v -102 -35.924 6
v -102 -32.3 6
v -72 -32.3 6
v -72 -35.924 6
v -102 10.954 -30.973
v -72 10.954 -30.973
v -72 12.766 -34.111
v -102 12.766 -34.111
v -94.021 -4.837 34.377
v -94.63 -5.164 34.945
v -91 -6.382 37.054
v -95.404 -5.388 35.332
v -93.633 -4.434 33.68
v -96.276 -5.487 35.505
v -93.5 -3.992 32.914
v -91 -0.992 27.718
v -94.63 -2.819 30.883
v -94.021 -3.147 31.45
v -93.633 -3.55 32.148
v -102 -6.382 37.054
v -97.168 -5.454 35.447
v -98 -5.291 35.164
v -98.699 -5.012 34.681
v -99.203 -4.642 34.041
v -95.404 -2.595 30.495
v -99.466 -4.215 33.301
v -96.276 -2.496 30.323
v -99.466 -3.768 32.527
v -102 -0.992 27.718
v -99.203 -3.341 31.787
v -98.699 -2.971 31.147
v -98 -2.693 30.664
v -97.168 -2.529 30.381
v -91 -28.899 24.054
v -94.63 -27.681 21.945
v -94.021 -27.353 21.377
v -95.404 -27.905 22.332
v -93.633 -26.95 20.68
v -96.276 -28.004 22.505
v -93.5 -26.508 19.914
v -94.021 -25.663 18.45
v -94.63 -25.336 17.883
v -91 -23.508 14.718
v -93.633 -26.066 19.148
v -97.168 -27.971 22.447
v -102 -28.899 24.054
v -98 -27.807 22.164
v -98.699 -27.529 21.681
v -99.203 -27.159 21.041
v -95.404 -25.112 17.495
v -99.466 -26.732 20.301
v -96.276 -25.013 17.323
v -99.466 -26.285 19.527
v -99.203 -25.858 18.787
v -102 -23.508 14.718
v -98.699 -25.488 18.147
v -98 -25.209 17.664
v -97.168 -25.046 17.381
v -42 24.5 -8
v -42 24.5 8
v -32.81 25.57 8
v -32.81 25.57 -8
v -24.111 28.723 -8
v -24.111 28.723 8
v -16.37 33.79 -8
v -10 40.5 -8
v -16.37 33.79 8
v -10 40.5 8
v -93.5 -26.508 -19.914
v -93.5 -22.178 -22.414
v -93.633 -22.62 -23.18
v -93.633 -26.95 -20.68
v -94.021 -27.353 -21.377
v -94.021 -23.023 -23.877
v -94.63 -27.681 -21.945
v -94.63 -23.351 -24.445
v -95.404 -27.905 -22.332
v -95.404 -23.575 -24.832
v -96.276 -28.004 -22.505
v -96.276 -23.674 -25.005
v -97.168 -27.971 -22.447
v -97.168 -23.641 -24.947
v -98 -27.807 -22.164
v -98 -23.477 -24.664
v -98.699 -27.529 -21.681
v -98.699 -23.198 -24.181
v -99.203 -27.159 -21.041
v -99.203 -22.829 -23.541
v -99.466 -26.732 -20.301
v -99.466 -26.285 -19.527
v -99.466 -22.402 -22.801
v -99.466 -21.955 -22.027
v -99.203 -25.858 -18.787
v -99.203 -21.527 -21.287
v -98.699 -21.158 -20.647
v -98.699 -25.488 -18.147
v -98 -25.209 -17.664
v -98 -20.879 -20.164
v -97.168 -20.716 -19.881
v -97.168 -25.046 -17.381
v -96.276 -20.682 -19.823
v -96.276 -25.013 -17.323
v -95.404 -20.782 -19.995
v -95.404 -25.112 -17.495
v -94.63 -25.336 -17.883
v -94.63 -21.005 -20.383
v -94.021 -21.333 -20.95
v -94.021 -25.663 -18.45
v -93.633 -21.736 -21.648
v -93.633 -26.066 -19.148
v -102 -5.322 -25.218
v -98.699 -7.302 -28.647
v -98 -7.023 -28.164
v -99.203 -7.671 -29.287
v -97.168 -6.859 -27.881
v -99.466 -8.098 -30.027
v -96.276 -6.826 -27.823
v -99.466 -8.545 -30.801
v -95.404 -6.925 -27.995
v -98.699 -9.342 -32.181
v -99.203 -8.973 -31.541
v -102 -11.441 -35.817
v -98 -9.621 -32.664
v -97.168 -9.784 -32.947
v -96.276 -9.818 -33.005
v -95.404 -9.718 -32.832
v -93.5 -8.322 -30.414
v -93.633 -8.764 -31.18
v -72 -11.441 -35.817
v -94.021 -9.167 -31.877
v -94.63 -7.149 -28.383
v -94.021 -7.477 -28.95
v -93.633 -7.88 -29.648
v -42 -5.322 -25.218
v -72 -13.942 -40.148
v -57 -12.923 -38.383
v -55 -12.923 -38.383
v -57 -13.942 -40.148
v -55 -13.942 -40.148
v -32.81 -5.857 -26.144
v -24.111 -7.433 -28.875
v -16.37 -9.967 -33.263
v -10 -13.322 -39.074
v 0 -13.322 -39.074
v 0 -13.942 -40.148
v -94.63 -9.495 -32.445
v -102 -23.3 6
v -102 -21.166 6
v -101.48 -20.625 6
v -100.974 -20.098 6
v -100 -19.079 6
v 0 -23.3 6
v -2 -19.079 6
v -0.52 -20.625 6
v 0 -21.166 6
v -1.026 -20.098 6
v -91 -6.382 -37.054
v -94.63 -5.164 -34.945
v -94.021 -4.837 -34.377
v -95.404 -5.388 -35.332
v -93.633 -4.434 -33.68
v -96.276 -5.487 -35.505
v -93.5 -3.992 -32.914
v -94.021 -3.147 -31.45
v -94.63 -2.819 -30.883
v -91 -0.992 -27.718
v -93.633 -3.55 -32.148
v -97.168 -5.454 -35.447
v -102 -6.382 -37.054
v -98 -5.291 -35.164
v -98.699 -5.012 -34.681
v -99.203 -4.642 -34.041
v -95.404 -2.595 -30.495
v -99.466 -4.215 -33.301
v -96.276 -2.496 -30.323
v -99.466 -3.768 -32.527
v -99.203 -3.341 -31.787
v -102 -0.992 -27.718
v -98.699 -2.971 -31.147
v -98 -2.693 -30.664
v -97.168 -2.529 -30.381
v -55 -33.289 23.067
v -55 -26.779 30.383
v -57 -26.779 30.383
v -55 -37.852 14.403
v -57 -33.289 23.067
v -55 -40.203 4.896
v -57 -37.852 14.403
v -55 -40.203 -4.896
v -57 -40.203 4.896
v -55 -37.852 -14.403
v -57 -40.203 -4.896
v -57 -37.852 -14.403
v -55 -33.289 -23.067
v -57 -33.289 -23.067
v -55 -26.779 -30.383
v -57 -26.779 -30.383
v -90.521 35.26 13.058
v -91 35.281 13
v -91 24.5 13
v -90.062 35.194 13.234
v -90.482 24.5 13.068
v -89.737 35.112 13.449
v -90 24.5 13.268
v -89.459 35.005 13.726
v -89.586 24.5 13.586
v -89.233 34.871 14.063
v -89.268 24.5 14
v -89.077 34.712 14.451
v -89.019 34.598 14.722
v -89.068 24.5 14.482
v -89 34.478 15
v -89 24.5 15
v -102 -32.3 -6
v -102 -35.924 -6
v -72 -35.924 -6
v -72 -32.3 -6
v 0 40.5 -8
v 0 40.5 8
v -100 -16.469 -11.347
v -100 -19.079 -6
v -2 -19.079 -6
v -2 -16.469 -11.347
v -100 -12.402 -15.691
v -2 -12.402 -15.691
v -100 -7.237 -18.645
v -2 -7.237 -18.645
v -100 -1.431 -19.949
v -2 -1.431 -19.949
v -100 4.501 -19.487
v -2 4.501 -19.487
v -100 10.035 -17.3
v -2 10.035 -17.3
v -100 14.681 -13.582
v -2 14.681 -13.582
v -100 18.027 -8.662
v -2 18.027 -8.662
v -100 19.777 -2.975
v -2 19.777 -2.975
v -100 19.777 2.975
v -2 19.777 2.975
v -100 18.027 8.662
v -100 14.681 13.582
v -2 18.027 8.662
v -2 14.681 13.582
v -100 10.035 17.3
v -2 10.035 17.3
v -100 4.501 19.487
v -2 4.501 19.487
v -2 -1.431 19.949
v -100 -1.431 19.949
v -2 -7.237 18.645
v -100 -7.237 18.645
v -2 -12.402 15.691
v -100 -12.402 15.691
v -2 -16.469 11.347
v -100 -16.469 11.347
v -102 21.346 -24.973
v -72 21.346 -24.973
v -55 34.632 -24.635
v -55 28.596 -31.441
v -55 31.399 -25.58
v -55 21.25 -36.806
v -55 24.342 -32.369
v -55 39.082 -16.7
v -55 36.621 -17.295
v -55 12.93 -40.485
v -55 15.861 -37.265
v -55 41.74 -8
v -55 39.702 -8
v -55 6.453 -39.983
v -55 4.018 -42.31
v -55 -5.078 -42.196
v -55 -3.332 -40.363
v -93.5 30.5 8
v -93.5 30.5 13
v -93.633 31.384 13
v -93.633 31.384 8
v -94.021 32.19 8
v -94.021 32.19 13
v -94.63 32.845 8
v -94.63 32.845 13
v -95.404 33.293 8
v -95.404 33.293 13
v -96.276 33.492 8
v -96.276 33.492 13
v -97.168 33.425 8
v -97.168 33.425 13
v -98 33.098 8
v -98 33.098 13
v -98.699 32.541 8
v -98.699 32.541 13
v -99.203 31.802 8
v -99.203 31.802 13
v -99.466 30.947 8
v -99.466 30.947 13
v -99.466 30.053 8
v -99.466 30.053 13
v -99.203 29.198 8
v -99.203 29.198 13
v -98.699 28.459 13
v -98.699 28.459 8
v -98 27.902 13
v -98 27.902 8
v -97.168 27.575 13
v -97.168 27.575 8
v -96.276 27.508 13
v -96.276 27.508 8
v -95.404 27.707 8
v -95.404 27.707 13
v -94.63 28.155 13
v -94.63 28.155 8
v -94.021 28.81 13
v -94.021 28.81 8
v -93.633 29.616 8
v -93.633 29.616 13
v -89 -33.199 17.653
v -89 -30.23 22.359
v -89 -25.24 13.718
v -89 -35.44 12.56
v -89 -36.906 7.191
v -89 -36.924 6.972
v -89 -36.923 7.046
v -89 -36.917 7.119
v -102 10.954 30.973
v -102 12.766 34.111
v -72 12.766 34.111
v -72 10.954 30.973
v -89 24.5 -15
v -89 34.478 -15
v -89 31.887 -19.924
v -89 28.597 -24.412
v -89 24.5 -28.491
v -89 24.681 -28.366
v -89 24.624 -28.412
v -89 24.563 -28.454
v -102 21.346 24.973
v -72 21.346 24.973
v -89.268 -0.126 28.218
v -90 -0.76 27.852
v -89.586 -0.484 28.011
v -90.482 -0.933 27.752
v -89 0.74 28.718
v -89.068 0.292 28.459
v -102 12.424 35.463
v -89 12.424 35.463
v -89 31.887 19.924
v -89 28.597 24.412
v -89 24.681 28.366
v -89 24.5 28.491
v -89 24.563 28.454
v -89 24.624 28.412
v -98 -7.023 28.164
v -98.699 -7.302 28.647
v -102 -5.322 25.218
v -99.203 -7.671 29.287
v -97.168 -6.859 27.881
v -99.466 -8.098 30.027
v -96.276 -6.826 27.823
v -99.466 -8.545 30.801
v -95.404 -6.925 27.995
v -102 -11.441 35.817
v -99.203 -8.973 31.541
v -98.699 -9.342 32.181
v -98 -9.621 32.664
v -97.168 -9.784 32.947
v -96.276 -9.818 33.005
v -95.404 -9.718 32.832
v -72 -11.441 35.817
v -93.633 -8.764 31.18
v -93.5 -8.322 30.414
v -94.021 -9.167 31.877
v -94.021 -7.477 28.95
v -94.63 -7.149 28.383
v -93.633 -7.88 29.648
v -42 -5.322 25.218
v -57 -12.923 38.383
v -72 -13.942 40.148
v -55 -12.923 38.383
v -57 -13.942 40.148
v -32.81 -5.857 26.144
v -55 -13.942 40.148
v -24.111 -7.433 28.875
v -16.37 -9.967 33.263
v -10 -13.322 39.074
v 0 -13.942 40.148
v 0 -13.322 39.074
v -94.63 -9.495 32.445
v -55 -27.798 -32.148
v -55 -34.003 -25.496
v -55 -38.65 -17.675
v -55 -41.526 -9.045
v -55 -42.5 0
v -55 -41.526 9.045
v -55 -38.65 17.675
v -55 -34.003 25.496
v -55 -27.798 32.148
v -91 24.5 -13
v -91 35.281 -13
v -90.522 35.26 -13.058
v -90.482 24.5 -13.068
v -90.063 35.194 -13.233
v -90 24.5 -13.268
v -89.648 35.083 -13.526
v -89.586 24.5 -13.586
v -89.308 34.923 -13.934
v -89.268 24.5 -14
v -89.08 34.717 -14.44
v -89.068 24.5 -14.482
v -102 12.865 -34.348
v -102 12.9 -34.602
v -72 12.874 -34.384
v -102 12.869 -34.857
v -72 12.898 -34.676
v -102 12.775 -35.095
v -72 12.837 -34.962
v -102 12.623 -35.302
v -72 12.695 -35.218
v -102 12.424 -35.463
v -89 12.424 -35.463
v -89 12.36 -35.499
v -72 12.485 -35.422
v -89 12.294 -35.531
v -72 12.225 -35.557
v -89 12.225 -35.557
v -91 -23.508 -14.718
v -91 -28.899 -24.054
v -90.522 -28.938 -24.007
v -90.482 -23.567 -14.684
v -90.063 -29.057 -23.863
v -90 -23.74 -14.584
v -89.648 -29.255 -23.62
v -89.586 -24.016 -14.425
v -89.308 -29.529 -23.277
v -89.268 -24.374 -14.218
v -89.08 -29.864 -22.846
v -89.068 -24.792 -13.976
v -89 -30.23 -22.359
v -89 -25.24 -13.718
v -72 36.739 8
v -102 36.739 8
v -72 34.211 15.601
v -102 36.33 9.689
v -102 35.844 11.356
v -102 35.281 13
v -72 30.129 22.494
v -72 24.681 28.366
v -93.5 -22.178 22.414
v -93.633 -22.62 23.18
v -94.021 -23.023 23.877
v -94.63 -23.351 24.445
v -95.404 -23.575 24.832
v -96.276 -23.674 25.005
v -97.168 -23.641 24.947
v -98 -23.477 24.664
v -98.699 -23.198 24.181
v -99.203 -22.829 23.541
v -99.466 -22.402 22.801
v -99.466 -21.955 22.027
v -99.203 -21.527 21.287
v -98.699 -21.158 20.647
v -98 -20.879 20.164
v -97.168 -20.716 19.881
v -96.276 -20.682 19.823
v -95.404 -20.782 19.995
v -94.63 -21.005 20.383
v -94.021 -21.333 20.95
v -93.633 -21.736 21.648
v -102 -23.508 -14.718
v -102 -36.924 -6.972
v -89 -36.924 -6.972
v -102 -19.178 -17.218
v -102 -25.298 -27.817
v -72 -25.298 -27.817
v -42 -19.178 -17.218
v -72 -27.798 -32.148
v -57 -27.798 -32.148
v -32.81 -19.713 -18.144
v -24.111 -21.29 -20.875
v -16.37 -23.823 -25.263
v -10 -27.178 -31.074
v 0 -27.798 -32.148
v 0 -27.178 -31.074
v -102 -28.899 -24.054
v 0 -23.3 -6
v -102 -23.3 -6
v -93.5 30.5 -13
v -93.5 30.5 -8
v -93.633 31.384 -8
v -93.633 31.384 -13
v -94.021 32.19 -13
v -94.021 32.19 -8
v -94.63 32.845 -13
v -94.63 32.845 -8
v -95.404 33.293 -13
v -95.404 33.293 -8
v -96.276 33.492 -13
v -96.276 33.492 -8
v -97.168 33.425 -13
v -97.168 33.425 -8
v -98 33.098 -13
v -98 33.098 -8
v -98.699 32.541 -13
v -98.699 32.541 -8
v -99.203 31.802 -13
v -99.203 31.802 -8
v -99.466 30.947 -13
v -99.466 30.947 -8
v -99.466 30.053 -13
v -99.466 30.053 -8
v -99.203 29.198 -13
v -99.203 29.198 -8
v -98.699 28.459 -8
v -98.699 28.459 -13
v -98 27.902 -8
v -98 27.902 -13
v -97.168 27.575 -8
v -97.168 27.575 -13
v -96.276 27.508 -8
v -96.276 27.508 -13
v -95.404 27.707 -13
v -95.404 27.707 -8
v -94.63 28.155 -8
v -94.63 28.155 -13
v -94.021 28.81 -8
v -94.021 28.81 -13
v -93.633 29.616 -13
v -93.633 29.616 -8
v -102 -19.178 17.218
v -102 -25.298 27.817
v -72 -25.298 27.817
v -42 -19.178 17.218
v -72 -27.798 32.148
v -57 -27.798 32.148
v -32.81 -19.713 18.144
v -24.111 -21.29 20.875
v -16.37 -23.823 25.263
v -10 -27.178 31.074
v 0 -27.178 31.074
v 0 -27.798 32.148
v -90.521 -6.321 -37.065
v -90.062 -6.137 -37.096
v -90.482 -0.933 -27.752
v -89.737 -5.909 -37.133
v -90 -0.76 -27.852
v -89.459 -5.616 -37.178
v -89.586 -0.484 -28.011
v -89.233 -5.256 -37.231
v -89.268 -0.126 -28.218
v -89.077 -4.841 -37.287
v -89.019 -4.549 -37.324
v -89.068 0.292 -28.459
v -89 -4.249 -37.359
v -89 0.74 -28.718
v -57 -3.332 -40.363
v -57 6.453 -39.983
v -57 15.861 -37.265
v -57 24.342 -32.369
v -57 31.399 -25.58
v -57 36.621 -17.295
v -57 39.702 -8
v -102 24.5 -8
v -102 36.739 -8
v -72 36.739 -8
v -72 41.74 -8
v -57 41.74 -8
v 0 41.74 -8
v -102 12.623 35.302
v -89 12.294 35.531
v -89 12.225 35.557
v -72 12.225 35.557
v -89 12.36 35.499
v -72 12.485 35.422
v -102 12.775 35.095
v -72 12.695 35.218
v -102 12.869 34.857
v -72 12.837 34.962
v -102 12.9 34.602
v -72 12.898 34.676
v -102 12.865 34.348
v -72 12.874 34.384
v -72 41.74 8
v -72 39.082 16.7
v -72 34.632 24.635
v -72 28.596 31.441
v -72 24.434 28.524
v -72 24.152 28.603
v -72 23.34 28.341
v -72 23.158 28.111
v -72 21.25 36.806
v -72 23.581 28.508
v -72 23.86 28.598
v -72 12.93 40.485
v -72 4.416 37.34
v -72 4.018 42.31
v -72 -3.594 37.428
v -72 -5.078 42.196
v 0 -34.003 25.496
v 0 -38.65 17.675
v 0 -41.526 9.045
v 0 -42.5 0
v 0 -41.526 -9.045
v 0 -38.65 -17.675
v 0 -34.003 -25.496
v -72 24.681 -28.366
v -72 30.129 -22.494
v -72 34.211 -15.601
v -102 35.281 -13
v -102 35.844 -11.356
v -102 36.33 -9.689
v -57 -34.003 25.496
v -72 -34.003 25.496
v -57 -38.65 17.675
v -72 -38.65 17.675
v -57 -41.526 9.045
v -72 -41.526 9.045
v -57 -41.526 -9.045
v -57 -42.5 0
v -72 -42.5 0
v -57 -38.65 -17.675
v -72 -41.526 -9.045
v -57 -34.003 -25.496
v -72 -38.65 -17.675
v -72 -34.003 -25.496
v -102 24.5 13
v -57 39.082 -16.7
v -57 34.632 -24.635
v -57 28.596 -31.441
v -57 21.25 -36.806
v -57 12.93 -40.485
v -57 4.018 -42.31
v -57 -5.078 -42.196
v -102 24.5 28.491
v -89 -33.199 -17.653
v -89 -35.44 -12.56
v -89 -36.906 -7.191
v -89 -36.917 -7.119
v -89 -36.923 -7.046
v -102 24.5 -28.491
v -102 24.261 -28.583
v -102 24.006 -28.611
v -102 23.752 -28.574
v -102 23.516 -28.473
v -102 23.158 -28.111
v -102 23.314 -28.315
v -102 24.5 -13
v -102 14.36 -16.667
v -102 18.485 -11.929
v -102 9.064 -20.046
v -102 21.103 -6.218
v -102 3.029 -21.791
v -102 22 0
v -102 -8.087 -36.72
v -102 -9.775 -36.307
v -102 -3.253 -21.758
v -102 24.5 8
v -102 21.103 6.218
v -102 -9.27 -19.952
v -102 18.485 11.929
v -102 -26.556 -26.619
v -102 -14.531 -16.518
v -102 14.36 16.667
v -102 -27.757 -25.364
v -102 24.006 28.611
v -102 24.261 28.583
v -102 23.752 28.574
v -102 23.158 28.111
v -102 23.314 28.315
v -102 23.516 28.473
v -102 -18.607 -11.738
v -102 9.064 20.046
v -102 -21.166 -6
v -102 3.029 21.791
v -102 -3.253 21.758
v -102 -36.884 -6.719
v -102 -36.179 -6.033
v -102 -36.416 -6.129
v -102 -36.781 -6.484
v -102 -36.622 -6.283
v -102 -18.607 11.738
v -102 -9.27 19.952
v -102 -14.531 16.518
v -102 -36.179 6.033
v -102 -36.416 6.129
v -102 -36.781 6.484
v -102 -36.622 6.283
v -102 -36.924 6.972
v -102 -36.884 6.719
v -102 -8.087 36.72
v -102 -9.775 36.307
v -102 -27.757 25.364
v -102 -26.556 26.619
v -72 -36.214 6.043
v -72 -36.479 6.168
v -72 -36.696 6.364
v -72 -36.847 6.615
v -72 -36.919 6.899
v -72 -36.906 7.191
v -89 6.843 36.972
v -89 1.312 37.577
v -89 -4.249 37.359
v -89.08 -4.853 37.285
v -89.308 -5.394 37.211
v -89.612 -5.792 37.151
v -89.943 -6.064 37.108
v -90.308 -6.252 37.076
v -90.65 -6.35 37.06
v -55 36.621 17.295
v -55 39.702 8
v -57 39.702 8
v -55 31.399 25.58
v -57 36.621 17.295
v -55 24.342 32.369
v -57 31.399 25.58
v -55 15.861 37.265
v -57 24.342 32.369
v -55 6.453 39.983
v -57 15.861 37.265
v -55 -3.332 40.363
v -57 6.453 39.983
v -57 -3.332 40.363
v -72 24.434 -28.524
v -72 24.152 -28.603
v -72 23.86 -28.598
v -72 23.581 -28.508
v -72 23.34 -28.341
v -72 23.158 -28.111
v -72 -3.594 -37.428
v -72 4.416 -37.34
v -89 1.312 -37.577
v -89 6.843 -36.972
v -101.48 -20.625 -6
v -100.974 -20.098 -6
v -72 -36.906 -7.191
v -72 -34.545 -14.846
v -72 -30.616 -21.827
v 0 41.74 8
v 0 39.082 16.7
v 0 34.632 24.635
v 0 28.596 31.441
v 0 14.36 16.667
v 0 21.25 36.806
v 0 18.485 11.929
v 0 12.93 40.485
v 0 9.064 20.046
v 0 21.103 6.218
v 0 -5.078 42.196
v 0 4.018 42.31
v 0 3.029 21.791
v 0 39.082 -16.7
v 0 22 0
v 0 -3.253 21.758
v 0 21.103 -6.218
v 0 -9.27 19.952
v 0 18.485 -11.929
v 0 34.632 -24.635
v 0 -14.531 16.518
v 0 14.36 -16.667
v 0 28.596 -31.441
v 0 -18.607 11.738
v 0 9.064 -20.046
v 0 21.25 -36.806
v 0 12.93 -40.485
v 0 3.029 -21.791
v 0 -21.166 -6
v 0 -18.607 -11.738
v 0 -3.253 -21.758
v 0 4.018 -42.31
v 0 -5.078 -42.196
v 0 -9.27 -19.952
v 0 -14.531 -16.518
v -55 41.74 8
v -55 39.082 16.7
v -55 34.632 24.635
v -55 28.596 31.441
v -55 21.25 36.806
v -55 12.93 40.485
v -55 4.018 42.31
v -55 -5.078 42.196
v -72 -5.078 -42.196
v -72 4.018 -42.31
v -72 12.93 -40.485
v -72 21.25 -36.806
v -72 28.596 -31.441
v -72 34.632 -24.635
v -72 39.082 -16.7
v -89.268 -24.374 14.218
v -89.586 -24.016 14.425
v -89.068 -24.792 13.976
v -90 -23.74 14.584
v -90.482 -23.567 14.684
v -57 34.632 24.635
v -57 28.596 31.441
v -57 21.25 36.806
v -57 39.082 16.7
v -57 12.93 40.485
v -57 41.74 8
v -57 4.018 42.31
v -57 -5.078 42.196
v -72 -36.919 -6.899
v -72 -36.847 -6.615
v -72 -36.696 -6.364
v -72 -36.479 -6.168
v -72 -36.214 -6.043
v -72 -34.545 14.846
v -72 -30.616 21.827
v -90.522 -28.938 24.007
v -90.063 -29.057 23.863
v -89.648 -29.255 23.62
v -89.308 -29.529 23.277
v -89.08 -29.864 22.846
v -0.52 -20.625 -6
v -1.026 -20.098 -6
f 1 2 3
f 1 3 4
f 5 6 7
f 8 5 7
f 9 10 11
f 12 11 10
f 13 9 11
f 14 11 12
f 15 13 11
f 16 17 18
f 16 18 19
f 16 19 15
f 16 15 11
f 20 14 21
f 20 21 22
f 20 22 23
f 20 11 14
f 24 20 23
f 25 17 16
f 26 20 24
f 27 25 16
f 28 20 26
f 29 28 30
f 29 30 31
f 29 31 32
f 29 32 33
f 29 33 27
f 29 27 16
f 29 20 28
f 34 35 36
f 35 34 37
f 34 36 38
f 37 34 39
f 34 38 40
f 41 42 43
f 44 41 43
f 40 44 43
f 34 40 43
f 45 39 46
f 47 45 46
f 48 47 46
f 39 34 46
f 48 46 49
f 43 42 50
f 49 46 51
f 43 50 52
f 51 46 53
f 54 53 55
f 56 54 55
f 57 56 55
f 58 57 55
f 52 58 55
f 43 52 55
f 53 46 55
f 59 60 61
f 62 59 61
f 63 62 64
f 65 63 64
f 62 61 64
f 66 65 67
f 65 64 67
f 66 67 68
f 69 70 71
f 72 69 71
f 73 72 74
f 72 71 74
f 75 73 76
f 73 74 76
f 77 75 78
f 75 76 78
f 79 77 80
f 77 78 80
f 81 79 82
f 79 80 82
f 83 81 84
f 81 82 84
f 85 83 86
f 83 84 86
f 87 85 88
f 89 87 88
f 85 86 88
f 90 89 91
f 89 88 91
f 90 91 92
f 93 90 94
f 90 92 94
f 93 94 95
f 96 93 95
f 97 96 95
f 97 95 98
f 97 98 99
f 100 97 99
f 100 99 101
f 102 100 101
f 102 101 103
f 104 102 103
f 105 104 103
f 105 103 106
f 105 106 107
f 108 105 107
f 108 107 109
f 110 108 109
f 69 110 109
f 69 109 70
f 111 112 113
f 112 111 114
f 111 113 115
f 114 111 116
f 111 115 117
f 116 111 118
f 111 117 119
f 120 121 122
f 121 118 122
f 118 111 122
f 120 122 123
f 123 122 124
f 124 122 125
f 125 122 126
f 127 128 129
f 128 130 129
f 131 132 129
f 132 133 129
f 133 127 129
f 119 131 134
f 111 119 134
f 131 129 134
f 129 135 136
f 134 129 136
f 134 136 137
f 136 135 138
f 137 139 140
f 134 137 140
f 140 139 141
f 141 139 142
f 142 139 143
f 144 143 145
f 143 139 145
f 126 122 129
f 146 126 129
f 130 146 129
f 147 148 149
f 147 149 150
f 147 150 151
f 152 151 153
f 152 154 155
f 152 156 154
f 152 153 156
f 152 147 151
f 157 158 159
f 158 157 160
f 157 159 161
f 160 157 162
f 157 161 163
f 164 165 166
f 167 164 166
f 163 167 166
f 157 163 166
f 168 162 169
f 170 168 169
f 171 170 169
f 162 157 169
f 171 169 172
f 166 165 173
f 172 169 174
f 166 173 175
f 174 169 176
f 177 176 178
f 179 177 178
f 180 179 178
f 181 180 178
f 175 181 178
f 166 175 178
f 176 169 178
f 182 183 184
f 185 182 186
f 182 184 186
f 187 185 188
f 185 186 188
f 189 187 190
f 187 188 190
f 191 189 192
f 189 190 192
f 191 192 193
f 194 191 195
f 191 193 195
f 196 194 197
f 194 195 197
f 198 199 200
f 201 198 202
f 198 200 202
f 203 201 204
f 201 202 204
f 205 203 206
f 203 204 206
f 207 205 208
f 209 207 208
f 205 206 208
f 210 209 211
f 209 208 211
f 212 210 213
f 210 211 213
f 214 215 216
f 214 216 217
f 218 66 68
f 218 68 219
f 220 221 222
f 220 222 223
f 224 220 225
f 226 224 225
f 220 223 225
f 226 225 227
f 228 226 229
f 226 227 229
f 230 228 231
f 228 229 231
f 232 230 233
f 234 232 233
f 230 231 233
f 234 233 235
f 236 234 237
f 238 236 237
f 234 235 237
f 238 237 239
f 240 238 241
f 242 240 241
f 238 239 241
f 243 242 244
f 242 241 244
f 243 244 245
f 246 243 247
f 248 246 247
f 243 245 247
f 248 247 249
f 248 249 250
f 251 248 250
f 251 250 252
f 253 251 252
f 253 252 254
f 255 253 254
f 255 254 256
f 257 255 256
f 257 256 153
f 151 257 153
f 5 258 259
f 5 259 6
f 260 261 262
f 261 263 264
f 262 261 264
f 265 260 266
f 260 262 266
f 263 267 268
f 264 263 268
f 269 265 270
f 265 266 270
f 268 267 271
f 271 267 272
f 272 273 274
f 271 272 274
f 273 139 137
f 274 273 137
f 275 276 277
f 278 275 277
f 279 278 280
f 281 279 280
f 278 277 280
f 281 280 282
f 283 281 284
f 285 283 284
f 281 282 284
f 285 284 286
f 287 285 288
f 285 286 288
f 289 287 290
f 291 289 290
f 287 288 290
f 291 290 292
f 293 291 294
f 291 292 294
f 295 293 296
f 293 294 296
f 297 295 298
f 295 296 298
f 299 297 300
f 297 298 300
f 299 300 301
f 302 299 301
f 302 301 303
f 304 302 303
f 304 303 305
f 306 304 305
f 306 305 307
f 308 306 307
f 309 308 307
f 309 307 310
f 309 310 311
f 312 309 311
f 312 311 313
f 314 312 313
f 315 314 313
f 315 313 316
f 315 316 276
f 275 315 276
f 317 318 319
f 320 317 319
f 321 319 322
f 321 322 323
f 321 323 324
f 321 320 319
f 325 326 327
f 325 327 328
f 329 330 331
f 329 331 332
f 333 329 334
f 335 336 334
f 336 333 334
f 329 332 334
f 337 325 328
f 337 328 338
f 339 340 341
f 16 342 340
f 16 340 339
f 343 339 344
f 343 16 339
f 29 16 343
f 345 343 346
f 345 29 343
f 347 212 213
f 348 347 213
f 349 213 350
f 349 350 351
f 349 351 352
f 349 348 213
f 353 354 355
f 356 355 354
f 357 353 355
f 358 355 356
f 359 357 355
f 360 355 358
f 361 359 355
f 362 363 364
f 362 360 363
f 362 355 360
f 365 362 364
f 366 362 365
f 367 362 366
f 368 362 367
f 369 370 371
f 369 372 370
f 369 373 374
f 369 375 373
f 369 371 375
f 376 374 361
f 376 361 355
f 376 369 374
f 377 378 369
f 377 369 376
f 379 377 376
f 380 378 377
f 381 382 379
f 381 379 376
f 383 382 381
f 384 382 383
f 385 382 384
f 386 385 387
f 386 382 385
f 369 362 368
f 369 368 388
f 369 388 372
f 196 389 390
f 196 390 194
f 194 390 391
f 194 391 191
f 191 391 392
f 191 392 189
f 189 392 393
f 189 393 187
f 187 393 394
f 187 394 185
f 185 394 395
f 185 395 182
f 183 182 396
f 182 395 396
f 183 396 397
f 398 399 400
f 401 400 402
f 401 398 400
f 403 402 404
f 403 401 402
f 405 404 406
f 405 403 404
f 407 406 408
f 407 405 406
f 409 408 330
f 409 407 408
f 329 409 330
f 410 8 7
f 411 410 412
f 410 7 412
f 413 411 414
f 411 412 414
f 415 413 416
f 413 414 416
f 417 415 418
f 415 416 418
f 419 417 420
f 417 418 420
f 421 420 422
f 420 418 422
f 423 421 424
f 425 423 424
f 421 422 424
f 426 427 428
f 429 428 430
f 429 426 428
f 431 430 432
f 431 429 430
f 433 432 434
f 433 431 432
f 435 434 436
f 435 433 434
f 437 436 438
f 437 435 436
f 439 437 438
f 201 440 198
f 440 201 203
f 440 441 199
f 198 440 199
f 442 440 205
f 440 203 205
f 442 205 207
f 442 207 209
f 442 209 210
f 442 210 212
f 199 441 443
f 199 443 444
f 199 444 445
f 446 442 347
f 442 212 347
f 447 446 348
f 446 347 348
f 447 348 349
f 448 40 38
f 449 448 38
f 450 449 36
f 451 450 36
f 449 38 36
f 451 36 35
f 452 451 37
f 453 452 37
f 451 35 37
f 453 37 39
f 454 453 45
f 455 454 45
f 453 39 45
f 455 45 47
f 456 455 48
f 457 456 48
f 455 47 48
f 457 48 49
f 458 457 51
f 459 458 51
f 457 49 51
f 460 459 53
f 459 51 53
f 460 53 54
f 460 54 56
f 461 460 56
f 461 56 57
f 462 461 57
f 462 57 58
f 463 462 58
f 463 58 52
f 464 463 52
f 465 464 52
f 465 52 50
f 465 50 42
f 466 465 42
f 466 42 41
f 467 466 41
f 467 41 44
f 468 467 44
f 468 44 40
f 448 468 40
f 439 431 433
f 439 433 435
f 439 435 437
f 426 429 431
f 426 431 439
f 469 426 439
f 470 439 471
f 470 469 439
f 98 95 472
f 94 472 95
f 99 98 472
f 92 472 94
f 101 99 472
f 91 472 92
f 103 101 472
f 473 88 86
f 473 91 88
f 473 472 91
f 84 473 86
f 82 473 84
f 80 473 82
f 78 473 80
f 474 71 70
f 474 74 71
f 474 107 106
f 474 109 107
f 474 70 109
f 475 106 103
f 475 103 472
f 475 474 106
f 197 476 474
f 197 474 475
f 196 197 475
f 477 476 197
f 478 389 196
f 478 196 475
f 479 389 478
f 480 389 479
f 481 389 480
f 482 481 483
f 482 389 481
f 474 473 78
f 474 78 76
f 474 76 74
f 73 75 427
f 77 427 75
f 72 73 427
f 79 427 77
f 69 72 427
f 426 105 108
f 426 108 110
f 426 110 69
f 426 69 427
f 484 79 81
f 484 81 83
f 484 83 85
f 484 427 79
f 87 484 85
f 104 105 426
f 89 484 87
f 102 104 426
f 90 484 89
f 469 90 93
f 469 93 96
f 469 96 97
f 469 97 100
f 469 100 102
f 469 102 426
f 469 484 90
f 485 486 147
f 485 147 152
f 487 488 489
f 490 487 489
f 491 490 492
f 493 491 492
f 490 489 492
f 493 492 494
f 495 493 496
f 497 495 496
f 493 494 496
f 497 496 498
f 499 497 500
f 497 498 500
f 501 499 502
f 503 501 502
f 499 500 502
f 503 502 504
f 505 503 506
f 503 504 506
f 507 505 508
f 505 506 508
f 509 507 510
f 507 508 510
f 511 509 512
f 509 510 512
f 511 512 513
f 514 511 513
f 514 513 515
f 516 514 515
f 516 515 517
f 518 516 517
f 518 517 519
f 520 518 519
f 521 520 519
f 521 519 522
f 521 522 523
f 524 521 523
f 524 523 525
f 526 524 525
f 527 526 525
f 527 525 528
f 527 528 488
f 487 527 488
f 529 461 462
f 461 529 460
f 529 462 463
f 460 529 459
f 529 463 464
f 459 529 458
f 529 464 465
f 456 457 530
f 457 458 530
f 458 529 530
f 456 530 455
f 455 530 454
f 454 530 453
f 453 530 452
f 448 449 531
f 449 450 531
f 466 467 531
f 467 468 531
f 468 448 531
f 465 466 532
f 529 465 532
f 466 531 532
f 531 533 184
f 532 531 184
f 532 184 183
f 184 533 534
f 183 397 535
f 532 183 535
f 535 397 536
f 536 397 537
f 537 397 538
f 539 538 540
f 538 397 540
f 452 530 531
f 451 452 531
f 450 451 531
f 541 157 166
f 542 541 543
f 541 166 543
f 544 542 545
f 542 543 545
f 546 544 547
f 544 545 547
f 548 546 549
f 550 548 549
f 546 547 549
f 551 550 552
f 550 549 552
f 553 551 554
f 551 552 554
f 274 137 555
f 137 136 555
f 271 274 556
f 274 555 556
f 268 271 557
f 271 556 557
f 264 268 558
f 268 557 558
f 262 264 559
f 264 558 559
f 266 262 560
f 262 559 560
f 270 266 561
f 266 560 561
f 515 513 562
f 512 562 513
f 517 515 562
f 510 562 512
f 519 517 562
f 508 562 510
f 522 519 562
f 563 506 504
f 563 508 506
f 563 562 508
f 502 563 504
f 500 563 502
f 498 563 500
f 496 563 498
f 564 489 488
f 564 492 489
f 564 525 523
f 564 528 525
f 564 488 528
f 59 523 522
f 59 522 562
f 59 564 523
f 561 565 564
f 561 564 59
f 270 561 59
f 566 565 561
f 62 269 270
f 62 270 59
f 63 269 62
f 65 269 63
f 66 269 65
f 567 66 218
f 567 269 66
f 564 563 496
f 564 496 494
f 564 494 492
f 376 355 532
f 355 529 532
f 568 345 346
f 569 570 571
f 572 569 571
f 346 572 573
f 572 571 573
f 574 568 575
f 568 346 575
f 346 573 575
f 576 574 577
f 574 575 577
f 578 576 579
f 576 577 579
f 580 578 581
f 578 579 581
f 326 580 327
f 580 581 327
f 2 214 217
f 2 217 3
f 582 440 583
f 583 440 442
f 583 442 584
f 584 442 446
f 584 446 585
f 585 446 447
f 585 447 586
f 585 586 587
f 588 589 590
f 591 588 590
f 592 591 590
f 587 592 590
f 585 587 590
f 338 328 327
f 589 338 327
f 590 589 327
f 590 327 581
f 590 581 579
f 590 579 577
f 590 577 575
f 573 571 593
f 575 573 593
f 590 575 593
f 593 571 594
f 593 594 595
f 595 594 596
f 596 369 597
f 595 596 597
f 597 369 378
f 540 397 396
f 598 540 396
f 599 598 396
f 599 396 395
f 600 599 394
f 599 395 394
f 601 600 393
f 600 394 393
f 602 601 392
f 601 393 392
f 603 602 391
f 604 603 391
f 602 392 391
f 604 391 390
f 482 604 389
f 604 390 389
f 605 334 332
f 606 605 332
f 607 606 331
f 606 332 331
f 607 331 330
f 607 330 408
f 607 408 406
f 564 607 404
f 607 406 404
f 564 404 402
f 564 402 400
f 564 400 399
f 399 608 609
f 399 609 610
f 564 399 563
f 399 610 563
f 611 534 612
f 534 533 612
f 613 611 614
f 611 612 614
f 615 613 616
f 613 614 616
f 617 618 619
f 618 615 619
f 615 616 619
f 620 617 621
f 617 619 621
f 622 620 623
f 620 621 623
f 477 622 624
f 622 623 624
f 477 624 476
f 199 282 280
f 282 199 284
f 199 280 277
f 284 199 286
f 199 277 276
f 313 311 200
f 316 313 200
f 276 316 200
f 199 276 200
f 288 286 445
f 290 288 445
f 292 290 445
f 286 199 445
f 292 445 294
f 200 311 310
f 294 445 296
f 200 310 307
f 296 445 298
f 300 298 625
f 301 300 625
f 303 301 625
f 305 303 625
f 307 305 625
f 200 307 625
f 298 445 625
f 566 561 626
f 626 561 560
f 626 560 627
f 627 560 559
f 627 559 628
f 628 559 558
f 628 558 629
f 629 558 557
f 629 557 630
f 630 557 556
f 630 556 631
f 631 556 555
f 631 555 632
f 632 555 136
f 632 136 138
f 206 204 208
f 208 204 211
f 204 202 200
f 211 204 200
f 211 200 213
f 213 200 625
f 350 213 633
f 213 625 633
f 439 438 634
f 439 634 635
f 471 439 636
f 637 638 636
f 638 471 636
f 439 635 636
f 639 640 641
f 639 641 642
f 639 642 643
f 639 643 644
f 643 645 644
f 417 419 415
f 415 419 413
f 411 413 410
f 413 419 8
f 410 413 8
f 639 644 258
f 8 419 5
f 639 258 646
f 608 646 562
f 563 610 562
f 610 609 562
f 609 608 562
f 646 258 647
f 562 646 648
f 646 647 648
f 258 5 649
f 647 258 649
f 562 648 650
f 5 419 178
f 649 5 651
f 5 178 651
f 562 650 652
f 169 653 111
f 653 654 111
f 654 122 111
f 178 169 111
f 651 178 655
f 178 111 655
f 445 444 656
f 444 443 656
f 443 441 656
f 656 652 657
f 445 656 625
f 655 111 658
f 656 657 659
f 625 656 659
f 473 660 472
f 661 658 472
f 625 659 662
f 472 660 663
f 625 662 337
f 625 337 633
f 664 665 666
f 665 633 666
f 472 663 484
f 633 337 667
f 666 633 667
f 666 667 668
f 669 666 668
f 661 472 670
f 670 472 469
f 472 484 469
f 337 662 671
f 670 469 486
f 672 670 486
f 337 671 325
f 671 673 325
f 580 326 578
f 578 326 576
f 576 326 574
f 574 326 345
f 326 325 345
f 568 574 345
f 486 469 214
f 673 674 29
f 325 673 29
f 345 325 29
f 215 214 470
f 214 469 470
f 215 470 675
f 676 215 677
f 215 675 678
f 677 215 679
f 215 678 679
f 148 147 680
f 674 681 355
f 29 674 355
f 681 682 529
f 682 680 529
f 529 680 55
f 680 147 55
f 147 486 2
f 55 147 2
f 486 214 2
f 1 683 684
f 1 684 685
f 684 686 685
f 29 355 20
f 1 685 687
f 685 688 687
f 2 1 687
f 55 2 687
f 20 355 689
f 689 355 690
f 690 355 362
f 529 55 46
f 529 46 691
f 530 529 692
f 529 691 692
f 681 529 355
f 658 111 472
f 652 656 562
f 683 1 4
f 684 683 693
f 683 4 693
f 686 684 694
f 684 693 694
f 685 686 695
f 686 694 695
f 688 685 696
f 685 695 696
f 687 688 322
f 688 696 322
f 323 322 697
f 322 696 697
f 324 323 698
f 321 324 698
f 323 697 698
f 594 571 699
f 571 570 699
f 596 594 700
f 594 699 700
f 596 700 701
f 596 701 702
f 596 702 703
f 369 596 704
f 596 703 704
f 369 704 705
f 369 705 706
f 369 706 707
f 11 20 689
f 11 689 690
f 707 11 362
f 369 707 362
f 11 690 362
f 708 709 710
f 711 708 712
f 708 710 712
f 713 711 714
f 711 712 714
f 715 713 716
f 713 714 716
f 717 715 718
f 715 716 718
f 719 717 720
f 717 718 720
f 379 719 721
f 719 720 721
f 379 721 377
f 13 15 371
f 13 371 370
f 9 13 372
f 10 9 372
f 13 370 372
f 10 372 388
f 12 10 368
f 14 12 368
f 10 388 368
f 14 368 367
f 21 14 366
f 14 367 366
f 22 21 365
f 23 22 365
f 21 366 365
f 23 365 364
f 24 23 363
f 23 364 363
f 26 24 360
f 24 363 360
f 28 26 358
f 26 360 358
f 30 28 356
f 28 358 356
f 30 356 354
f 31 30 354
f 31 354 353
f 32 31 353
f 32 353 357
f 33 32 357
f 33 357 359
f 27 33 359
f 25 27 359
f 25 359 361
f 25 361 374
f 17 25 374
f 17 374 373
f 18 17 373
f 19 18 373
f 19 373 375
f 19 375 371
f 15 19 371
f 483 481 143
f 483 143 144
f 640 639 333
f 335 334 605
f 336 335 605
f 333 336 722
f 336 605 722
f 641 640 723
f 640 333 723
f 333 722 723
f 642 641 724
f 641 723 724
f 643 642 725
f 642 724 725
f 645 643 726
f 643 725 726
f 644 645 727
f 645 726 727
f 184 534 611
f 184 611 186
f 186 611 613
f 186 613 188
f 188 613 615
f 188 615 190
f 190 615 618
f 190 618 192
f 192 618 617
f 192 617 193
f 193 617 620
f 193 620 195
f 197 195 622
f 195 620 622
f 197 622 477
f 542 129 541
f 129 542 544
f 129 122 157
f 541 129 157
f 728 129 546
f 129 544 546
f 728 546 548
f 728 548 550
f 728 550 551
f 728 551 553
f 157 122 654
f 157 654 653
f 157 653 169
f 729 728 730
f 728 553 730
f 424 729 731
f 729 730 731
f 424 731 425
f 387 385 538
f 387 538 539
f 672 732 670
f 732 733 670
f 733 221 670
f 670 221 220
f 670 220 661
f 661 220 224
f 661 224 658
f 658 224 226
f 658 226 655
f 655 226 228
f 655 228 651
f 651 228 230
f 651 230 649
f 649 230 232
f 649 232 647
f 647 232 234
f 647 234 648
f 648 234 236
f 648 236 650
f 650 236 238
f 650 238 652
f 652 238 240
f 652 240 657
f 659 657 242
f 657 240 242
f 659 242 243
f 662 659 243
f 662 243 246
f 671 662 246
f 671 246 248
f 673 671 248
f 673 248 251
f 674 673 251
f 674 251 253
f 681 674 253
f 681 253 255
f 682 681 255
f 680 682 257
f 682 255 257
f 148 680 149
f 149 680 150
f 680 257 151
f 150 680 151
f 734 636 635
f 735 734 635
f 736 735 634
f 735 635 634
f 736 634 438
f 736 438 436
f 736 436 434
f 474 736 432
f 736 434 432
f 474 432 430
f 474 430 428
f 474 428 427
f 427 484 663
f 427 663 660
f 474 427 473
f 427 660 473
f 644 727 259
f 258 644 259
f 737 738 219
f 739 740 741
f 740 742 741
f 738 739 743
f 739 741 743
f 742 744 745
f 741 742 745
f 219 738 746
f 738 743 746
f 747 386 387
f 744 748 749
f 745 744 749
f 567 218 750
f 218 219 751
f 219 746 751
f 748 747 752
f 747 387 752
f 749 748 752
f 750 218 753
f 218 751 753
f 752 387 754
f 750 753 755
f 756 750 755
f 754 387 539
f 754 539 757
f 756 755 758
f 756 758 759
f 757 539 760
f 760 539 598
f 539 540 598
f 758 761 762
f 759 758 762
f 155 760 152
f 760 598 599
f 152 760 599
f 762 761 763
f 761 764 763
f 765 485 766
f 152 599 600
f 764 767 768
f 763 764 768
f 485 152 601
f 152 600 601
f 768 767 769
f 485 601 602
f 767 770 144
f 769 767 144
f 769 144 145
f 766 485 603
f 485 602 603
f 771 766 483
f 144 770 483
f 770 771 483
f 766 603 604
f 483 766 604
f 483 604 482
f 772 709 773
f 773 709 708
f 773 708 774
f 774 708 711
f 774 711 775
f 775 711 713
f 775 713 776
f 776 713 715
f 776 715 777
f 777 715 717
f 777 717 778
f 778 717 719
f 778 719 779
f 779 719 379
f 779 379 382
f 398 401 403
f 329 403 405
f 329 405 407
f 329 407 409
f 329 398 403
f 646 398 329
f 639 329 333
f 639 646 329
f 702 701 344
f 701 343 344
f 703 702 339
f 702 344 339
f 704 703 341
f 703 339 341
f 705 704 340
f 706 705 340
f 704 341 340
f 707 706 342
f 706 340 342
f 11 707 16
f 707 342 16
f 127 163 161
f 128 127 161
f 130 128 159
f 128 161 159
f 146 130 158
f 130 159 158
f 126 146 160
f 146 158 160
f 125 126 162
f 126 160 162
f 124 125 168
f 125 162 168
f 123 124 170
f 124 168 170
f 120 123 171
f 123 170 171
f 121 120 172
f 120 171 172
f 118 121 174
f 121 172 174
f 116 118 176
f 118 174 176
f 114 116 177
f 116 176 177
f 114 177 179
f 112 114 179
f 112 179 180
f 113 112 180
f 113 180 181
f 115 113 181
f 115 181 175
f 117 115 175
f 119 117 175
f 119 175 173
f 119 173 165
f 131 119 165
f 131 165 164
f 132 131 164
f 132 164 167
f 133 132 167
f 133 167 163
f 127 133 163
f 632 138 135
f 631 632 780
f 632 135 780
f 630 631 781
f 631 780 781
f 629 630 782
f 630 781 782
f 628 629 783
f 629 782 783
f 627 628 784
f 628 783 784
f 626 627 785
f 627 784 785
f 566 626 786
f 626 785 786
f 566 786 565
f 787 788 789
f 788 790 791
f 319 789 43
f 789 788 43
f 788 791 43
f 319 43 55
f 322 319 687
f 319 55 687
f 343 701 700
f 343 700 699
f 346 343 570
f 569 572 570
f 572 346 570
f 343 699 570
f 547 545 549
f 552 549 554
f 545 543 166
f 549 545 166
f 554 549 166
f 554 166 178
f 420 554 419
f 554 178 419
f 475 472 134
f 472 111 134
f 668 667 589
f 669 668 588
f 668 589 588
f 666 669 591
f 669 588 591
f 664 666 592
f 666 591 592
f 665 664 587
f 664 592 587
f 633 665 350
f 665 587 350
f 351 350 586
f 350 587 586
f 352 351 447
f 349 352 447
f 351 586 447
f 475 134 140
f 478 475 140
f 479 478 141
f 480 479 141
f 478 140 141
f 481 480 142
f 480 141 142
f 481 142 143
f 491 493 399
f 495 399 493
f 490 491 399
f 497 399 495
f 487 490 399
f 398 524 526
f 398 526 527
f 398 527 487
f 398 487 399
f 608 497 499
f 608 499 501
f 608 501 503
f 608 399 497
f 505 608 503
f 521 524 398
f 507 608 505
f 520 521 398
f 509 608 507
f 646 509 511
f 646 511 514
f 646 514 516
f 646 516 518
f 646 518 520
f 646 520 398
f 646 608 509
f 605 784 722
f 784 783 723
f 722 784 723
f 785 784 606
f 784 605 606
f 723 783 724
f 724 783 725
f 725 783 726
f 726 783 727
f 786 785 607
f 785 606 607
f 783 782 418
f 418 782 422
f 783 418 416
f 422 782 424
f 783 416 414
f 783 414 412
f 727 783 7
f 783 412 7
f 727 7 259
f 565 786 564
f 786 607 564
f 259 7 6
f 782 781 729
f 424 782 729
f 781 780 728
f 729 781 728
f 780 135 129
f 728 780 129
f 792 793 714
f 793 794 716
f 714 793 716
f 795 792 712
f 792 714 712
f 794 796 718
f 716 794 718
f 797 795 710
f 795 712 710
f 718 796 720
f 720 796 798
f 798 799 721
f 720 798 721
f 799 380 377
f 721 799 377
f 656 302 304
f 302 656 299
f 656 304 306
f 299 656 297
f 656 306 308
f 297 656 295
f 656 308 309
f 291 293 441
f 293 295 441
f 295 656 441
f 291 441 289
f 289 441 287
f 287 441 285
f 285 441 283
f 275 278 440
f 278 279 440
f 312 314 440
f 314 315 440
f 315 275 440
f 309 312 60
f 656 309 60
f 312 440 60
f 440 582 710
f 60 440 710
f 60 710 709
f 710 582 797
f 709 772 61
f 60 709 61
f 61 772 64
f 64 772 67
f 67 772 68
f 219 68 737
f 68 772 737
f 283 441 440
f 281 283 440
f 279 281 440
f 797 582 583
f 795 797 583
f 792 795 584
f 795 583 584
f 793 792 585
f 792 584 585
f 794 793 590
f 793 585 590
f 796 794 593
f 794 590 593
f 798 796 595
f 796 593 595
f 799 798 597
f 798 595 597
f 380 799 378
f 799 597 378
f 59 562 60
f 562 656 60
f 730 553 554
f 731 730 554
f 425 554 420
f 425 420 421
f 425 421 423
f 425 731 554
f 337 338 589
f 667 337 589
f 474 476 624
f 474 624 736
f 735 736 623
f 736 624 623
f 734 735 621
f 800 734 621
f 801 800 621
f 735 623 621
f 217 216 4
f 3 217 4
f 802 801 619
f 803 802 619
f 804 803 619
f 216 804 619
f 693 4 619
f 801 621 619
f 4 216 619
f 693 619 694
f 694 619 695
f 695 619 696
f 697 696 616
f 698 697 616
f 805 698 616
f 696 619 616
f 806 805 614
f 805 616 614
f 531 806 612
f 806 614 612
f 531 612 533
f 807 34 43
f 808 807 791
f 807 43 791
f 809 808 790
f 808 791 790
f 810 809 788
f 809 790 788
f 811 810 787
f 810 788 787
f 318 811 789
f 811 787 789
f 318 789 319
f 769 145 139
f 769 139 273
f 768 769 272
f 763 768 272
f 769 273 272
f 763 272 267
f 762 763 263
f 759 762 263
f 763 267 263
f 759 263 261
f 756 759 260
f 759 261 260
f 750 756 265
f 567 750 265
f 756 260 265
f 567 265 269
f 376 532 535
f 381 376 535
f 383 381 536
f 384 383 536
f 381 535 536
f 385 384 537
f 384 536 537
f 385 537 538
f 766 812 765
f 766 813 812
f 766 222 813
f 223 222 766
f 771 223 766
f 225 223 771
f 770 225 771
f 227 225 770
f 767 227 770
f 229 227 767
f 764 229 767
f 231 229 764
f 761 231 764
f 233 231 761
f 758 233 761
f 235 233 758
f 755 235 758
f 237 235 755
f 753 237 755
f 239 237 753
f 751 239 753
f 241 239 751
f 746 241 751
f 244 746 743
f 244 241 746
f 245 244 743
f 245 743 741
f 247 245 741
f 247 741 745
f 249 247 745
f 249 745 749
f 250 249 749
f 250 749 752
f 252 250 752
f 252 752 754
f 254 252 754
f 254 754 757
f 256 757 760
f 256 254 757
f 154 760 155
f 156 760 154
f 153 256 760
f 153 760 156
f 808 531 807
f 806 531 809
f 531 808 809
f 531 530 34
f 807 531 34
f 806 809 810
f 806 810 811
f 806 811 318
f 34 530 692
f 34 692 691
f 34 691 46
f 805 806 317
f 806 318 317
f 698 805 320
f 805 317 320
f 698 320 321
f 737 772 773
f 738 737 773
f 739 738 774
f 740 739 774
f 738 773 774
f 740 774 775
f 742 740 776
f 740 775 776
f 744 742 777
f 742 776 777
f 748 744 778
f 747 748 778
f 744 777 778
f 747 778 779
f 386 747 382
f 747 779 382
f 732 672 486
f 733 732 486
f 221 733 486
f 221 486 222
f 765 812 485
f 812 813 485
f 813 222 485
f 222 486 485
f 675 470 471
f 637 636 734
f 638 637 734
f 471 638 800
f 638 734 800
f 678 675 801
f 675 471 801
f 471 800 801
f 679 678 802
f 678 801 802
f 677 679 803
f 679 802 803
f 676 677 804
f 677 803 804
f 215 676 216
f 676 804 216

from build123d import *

# Parameters (mm, degrees)
CUT_EXTRUDE1_DEPTH       = 8
CIRPATTERN1_COUNT        = 3
CUT_EXTRUDE2_DEPTH       = 13
FILLET1_R                = 2
CUT_EXTRUDE3_REACH       = 125.655
SKETCH6_R                = 3
CIRPATTERN2_COUNT        = 3
FILLET1_OF_CIRPATTERN2_R = 2
CUT_EXTRUDE4_DEPTH       = 30
FILLET2_R                = 1
CIRPATTERN3_COUNT        = 3
FILLET2_OF_CIRPATTERN3_R = 1
CUT_EXTRUDE5_REACH       = 130.22
SKETCH9_W                = 102
SKETCH9_H                = 12
CHAMFER2_SIZE            = 2


with BuildPart() as part:
    # Sketch1 → Revolve1 (revolve)
    with BuildSketch(Plane.XY, mode=Mode.PRIVATE) as revolve1_sk:
        Polygon((0, 20), (0, 42.5), (-55, 42.5), (-55, 40.5), (-57, 40.5), (-57, 42.5), (-72, 42.5), (-72, 37.6), (-102, 37.6), (-102, 20), align=None)
    revolve(revolve1_sk.sketch.rotate(Axis((-534.701035213, 0, 0), (1, 0, 0)), 90), axis=Axis((-534.701035213, 0, 0), (1, 0, 0)))

    # Sketch3 → Cut-Extrude1 (cut, symmetric)
    with BuildSketch(Plane.XY):
        with BuildLine():
            Line((-102, 24.5), (-42, 24.5))
            ThreePointArc((-42, 24.5), (-24.11145618, 28.72291236), (-10, 40.5))
            Line((-10, 40.5), (0, 40.5))
            Line((0, 40.5), (0, 42.5))
            Line((0, 42.5), (-55, 42.5))
            Line((-55, 42.5), (-55, 40.5))
            Line((-55, 40.5), (-57, 40.5))
            Line((-57, 40.5), (-57, 42.5))
            Line((-57, 42.5), (-72, 42.5))
            Line((-72, 42.5), (-72, 37.6))
            Line((-72, 37.6), (-102, 37.6))
            Line((-102, 37.6), (-102, 24.5))
        make_face()
    cut_extrude1 = extrude(amount=CUT_EXTRUDE1_DEPTH, both=True, mode=Mode.SUBTRACT)

    # CirPattern1: Cut-Extrude1 ×3 about axis
    cirpattern1_axis = Axis((0, 0, 0), (1, 0, 0))
    for i in range(1, CIRPATTERN1_COUNT):
        add(cut_extrude1.rotate(cirpattern1_axis, i * 360 / CIRPATTERN1_COUNT), mode=Mode.SUBTRACT)

    # Sketch4 → Cut-Extrude2 (cut)
    with BuildSketch(Plane.ZY.offset(102)):
        with BuildLine():
            Line((-13, 35.281156444), (-13, 24.5))
            Line((-13, 24.5), (-28.522096697, 24.5))
            ThreePointArc((-28.522096697, 24.5), (-21.449462979, 30.881718506), (-13, 35.281156444))
        make_face()
        with BuildLine():
            Line((13, 35.281156444), (13, 24.5))
            Line((13, 24.5), (28.522096697, 24.5))
            ThreePointArc((28.522096697, 24.5), (21.449462979, 30.881718506), (13, 35.281156444))
        make_face()
    cut_extrude2 = extrude(amount=-CUT_EXTRUDE2_DEPTH, mode=Mode.SUBTRACT)

    # Fillet1
    fillet1_edges = [part.edges().sort_by_distance(p)[0] for p in [
        (-89, 29.890578222, -13),
        (-89, 29.890578222, 13),
    ]]
    fillet(fillet1_edges, radius=FILLET1_R)

    # Cut-Extrude3: up to this face of the body (flat: up to its plane)
    cut_extrude3_end = Plane(part.part.faces().sort_by_distance((-96.5, 29.890578222, -13))[0])
    # Sketch6 → Cut-Extrude3 (cut, up to the picked face)
    with BuildSketch(Plane.XY.offset(13), mode=Mode.PRIVATE) as cut_extrude3_sk1:
        with Locations((-96.5, 30.5)):
            Circle(SKETCH6_R)
    cut_extrude3_tool1 = split(extrude(cut_extrude3_sk1.sketch, amount=-CUT_EXTRUDE3_REACH, mode=Mode.PRIVATE), bisect_by=cut_extrude3_end, keep=Keep.BOTH, mode=Mode.PRIVATE)
    cut_extrude3 = cut_extrude3_tool1.solids().sort_by(Axis((-96.5, 30.5, 13), (0, 0, -1)))[0]
    add(cut_extrude3, mode=Mode.SUBTRACT)

    # CirPattern2: Cut-Extrude2, Cut-Extrude3 ×3 about axis
    cirpattern2_axis = Axis((0, 0, 0), (1, 0, 0))
    add([cut_extrude2.rotate(cirpattern2_axis, i * 360 / CIRPATTERN2_COUNT) for i in range(1, CIRPATTERN2_COUNT)], mode=Mode.SUBTRACT)
    add([cut_extrude3.rotate(cirpattern2_axis, i * 360 / CIRPATTERN2_COUNT) for i in range(1, CIRPATTERN2_COUNT)], mode=Mode.SUBTRACT)

    # Fillet1 of CirPattern2
    fillet1_of_cirpattern2_edges = [part.edges().sort_by_distance(p)[0] for p in [
        (-89, -3.686958862, 32.386000074),
        (-89, -26.20361936, 19.386000074),
        (-89, -26.20361936, -19.386000074),
        (-89, -3.686958862, -32.386000074),
    ]]
    fillet(fillet1_of_cirpattern2_edges, radius=FILLET1_OF_CIRPATTERN2_R)

    # Sketch7 → Cut-Extrude4 (cut)
    with BuildSketch(Plane.ZY.offset(102)):
        with BuildLine():
            Line((-6, -37.118189611), (-6, -32.3))
            Line((-6, -32.3), (6, -32.3))
            Line((6, -32.3), (6, -37.118189611))
            ThreePointArc((6, -37.118189611), (0, -37.6), (-6, -37.118189611))
        make_face()
    cut_extrude4 = extrude(amount=-CUT_EXTRUDE4_DEPTH, mode=Mode.SUBTRACT)

    # Fillet2
    fillet2_edges = [part.edges().sort_by_distance(p)[0] for p in [
        (-87, -37.118189611, 6),
        (-87, -37.118189611, -6),
    ]]
    fillet(fillet2_edges, radius=FILLET2_R)

    # CirPattern3: Cut-Extrude4 ×3 about axis
    cirpattern3_axis = Axis((0, 0, 0), (1, 0, 0))
    for i in range(1, CIRPATTERN3_COUNT):
        add(cut_extrude4.rotate(cirpattern3_axis, i * 360 / CIRPATTERN3_COUNT), mode=Mode.SUBTRACT)

    # Fillet2 of CirPattern3
    fillet2_of_cirpattern3_edges = [part.edges().sort_by_distance(p)[0] for p in [
        (-87, 13.362942383, -35.145295146),
        (-87, 23.755247228, -29.145295146),
        (-87, 23.755247228, 29.145295146),
        (-87, 13.362942383, 35.145295146),
    ]]
    fillet(fillet2_of_cirpattern3_edges, radius=FILLET2_OF_CIRPATTERN3_R)

    # Sketch9 → Cut-Extrude5 (cut, up to next)
    with BuildSketch(Plane(origin=(0, -23.3, 0), x_dir=(1, 0, 0), z_dir=(0, 1, 0)), mode=Mode.PRIVATE) as cut_extrude5_sk1:
        with Locations((-51, 0)):
            Rectangle(SKETCH9_W, SKETCH9_H)
    cut_extrude5_tool1 = extrude(cut_extrude5_sk1.sketch, amount=CUT_EXTRUDE5_REACH, mode=Mode.PRIVATE) & part.part
    add(cut_extrude5_tool1.solids().sort_by_distance((-51, -23.3, 0))[0], mode=Mode.SUBTRACT)

    # Chamfer2
    chamfer2_edges = [part.edges().sort_by_distance(p)[0] for p in [
        (0, 20, 0),
        (-102, 20, 0),
    ]]
    chamfer(chamfer2_edges, length=CHAMFER2_SIZE)


solid = part.part
